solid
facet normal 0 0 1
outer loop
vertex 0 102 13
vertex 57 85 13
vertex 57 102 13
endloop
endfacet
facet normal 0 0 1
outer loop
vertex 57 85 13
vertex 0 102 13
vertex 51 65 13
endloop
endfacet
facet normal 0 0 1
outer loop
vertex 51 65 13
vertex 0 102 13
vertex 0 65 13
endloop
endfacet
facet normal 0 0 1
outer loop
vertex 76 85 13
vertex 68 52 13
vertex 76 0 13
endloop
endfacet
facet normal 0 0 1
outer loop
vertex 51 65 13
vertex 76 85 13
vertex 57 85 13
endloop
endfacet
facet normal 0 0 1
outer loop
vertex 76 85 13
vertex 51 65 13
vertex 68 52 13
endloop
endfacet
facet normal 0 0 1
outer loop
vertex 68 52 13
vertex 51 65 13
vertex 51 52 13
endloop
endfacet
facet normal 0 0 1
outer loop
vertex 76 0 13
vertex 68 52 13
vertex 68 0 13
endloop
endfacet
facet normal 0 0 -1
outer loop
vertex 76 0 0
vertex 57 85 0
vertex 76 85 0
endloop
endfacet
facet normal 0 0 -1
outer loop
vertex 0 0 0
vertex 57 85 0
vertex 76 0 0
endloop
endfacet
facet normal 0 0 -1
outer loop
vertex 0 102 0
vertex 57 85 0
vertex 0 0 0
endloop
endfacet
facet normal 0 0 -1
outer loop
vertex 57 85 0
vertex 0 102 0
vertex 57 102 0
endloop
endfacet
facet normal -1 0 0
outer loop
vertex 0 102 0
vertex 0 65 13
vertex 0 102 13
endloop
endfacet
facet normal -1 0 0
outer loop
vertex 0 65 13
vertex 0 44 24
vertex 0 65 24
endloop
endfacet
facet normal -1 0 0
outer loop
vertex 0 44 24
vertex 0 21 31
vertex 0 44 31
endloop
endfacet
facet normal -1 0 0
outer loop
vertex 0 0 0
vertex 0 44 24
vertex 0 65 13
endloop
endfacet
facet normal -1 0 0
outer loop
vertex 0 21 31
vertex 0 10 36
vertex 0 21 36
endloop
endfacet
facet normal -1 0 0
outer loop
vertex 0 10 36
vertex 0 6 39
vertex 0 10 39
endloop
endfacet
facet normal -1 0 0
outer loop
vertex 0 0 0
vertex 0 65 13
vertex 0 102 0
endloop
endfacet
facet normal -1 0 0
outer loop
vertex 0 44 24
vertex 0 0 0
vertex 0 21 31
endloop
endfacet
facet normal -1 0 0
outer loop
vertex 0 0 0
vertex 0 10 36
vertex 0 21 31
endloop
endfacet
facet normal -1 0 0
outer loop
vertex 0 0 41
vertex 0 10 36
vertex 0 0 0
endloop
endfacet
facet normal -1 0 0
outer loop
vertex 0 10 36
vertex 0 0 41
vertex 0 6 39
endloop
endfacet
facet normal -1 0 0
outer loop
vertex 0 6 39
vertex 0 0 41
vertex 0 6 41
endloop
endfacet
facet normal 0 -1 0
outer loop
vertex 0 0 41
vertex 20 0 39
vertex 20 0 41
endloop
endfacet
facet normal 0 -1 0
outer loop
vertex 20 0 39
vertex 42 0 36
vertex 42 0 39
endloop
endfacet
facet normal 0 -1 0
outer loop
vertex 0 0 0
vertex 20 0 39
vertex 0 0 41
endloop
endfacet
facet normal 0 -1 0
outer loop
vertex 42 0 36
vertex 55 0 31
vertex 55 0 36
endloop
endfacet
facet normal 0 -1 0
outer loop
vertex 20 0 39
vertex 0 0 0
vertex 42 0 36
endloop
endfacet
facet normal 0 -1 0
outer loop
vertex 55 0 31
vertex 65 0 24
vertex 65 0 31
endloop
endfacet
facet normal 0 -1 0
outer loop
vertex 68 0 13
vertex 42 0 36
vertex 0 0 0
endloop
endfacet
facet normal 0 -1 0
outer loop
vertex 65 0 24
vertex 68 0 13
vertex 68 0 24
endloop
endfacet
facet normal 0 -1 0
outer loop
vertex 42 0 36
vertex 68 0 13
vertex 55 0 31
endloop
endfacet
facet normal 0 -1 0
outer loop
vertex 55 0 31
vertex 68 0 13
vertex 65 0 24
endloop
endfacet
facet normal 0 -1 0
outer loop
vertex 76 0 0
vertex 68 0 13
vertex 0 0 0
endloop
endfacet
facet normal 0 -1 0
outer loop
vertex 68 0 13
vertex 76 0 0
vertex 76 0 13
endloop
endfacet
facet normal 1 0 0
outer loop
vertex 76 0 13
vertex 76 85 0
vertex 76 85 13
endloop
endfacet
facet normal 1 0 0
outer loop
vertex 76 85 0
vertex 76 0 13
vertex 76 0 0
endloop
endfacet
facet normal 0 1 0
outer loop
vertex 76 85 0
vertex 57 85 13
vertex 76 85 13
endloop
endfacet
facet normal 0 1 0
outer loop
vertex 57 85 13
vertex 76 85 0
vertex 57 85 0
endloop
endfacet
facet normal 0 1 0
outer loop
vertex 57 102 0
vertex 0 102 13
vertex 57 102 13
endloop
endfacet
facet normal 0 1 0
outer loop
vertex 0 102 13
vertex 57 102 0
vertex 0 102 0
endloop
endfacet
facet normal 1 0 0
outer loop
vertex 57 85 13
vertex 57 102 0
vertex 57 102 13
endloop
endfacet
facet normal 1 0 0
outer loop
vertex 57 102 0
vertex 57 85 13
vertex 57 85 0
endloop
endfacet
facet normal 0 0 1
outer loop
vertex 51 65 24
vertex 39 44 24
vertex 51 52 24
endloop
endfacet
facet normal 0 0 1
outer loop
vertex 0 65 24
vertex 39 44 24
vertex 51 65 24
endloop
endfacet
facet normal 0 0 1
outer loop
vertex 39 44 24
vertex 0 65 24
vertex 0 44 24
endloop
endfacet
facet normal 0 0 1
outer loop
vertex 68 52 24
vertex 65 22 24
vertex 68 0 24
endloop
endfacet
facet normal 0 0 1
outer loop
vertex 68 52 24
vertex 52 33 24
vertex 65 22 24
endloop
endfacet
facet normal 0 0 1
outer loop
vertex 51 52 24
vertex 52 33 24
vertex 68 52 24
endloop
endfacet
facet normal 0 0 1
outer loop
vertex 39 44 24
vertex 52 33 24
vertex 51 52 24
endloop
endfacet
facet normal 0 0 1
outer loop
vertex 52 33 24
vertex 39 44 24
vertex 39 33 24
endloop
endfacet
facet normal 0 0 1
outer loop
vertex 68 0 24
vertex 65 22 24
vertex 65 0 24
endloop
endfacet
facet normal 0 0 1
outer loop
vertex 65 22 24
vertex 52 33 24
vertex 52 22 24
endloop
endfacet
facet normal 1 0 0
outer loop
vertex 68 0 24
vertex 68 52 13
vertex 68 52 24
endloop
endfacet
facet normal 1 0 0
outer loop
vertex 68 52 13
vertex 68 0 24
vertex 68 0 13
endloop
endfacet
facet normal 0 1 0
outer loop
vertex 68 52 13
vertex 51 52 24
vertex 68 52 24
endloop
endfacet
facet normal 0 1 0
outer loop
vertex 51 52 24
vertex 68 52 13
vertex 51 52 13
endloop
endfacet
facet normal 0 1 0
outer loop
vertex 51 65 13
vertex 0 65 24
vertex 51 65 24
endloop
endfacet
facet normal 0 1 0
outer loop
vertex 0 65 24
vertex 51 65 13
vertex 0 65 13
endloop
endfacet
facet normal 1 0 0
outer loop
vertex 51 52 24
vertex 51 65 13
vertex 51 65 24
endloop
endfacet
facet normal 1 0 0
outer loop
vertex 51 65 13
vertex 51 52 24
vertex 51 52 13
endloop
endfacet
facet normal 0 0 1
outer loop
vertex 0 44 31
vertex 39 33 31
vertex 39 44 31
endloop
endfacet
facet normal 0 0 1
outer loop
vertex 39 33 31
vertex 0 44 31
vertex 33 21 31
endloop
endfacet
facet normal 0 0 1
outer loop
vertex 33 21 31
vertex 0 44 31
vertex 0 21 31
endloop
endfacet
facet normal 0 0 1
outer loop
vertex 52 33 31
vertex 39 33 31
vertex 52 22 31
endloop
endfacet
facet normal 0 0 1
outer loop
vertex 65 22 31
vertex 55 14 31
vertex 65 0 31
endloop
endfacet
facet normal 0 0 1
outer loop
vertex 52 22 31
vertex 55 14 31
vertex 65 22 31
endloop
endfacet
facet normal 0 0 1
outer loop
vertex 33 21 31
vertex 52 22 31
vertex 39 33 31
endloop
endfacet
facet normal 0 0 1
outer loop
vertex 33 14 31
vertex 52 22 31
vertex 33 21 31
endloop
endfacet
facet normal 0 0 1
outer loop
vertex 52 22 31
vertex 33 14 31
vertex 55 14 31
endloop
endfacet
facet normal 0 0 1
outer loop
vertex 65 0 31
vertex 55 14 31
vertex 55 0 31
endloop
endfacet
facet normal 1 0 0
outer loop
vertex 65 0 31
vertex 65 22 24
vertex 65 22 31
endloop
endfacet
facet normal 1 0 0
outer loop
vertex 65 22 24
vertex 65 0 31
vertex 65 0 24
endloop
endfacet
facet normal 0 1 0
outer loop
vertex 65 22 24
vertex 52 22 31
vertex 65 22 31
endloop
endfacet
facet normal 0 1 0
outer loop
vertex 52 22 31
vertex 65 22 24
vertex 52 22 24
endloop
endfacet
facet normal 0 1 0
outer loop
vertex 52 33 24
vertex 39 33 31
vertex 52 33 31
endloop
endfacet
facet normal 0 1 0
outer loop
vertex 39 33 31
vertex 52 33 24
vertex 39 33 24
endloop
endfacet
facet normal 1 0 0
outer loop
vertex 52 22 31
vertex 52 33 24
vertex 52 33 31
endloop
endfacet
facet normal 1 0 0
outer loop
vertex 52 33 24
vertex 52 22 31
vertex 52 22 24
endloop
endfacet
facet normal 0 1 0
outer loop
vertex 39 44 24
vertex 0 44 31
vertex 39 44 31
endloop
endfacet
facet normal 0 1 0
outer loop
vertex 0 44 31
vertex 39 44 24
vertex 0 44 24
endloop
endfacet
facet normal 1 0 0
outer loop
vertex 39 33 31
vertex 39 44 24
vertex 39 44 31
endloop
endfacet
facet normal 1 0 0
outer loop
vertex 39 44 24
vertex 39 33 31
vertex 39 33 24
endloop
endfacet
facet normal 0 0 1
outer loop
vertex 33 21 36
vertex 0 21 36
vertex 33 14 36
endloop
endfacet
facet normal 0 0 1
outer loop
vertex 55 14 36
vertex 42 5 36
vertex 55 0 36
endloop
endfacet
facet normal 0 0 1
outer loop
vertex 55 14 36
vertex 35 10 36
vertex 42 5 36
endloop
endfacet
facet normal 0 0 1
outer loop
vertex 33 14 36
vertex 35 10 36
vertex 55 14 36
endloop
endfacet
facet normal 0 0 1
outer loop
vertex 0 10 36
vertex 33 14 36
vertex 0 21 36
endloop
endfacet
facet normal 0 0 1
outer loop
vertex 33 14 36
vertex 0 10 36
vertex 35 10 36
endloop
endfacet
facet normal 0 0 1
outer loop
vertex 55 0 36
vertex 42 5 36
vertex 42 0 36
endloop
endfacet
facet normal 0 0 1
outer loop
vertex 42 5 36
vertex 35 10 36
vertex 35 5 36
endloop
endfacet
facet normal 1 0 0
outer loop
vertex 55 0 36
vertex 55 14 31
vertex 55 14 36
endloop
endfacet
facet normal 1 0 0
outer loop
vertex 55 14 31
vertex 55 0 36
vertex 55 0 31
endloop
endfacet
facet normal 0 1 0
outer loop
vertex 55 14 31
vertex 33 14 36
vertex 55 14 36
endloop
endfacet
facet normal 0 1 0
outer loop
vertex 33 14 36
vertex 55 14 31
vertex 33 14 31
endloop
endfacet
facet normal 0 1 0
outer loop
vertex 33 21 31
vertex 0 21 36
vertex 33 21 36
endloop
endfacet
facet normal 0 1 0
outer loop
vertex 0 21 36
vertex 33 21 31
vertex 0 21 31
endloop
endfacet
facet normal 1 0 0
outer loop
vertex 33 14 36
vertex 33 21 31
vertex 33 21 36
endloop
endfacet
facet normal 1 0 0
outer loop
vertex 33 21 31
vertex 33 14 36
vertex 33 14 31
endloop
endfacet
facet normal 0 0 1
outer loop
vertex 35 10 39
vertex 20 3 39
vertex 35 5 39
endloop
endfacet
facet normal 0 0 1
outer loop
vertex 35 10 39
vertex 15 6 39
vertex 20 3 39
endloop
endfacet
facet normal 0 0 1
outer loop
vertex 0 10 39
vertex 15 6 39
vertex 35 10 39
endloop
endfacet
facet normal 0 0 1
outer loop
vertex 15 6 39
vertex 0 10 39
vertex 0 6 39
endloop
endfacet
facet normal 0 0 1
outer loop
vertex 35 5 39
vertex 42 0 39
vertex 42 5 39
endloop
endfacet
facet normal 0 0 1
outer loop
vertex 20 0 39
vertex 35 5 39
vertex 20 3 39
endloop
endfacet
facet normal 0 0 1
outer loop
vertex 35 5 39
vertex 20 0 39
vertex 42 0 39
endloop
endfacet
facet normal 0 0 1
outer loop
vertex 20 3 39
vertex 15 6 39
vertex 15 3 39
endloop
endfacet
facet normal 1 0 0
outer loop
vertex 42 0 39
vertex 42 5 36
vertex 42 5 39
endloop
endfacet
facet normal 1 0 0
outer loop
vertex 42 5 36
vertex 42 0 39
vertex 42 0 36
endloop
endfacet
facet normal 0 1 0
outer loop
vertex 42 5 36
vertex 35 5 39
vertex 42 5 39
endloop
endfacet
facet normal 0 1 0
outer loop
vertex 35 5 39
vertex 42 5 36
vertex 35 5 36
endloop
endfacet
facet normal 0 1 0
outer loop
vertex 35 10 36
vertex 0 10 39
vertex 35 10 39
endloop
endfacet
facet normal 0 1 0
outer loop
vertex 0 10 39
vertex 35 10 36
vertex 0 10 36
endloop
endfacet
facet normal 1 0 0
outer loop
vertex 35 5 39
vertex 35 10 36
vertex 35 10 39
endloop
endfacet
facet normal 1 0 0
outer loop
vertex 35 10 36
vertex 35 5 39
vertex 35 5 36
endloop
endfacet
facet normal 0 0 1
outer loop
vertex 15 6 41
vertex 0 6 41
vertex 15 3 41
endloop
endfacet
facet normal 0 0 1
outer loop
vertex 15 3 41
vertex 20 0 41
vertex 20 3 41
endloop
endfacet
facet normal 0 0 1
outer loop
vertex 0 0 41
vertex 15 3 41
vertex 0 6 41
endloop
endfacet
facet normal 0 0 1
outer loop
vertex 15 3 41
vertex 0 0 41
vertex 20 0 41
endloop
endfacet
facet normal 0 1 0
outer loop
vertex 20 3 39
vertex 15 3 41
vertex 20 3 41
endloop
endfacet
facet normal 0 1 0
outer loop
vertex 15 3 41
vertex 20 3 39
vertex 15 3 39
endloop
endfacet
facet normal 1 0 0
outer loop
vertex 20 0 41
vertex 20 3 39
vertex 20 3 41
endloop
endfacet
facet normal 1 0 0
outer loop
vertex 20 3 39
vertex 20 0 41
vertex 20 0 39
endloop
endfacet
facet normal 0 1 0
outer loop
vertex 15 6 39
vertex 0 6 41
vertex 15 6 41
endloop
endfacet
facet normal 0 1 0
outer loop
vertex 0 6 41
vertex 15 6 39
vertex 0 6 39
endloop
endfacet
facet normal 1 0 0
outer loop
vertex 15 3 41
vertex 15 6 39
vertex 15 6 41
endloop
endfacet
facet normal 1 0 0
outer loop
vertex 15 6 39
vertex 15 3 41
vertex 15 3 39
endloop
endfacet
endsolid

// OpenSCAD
translate([9.5, 8.5, 6.5]) color([0.4012165411640888, 0.4679428423906348, 0.5596131508667647]) cube([19, 17, 13], center=true);
translate([28.5, 8.5, 6.5]) color([0.29896126951320356, 0.6321114709426877, 0.7423454703026071]) cube([19, 17, 13], center=true);
translate([47.5, 8.5, 6.5]) color([0.21800995973285464, 0.48885816108208613, 0.501567157493831]) cube([19, 17, 13], center=true);
translate([66.5, 8.5, 6.5]) color([0.49271975198428686, 0.958422556968198, 0.44398175403613704]) cube([19, 17, 13], center=true);
translate([9.5, 25.5, 6.5]) color([0.14281143058247625, 0.4955231327742775, 0.8873352305676206]) cube([19, 17, 13], center=true);
translate([28.5, 25.5, 6.5]) color([0.21571394075115613, 0.3554013630116646, 0.39096604949642]) cube([19, 17, 13], center=true);
translate([47.5, 25.5, 6.5]) color([0.9928835035123682, 0.8462248334797323, 0.9789066021625461]) cube([19, 17, 13], center=true);
translate([66.5, 25.5, 6.5]) color([0.6868956228130294, 0.08137290691060206, 0.9493092651810784]) cube([19, 17, 13], center=true);
translate([9.5, 42.5, 6.5]) color([0.9246190463677613, 0.3951154575230438, 0.3612783181755085]) cube([19, 17, 13], center=true);
translate([28.5, 42.5, 6.5]) color([0.11615210489091876, 0.0037403702712440756, 0.2703277384724262]) cube([19, 17, 13], center=true);
translate([47.5, 42.5, 6.5]) color([0.6403732426441148, 0.29252642189785794, 0.9007258804640697]) cube([19, 17, 13], center=true);
translate([66.5, 42.5, 6.5]) color([0.14067978971908934, 0.5728503338092871, 0.1912043400515635]) cube([19, 17, 13], center=true);
translate([9.5, 59.5, 6.5]) color([0.43401891336511733, 0.7163457448050065, 0.3841301513333275]) cube([19, 17, 13], center=true);
translate([28.5, 59.5, 6.5]) color([0.33069552050314754, 0.6480049557775331, 0.6874717059379091]) cube([19, 17, 13], center=true);
translate([47.5, 59.5, 6.5]) color([0.14801928734251768, 0.93323205939552, 0.14750072005511716]) cube([19, 17, 13], center=true);
translate([66.5, 59.5, 6.5]) color([0.31607169754224296, 0.2088660889148145, 0.1868244368145192]) cube([19, 17, 13], center=true);
translate([9.5, 76.5, 6.5]) color([0.3491672112743387, 0.9834841816788549, 0.427290207198605]) cube([19, 17, 13], center=true);
translate([28.5, 76.5, 6.5]) color([0.49195852420878716, 0.7297831417632067, 0.7955834433152874]) cube([19, 17, 13], center=true);
translate([47.5, 76.5, 6.5]) color([0.43927203819181504, 0.2042687131951023, 0.709997013582239]) cube([19, 17, 13], center=true);
translate([66.5, 76.5, 6.5]) color([0.9058221085991531, 0.03327924187503195, 0.6331757983912308]) cube([19, 17, 13], center=true);
translate([9.5, 93.5, 6.5]) color([0.8710093735661795, 0.3636101637556439, 0.7431628081058981]) cube([19, 17, 13], center=true);
translate([28.5, 93.5, 6.5]) color([0.6774926049513658, 0.23306417175218364, 0.2975271762349214]) cube([19, 17, 13], center=true);
translate([47.5, 93.5, 6.5]) color([0.0866296567389645, 0.8688435220131177, 0.7514921149941085]) cube([19, 17, 13], center=true);
translate([8.5, 6.5, 18.5]) color([0.7714305883456576, 0.8829516943772963, 0.4114323292545551]) cube([17, 13, 11], center=true);
translate([25.5, 6.5, 18.5]) color([0.05394001775890156, 0.696805048854085, 0.6656296547984208]) cube([17, 13, 11], center=true);
translate([42.5, 6.5, 18.5]) color([0.6485122289860075, 0.5471816206705559, 0.7344166333532061]) cube([17, 13, 11], center=true);
translate([59.5, 6.5, 18.5]) color([0.4306045068871984, 0.45460236437769275, 0.25475221651879554]) cube([17, 13, 11], center=true);
translate([8.5, 19.5, 18.5]) color([0.47565246533915095, 0.3371942584654095, 0.04223511400675217]) cube([17, 13, 11], center=true);
translate([25.5, 19.5, 18.5]) color([0.05255331220371673, 0.34980223330761895, 0.2898096938030986]) cube([17, 13, 11], center=true);
translate([42.5, 19.5, 18.5]) color([0.007130057665757694, 0.06369015415518986, 0.42774457246440645]) cube([17, 13, 11], center=true);
translate([59.5, 19.5, 18.5]) color([0.22216650821772055, 0.6086379170158094, 0.557768500755667]) cube([17, 13, 11], center=true);
translate([8.5, 32.5, 18.5]) color([0.22097295115667703, 0.19284823789822858, 0.6083188139076446]) cube([17, 13, 11], center=true);
translate([25.5, 32.5, 18.5]) color([0.606354511401297, 0.08562053587131313, 0.31903016062772993]) cube([17, 13, 11], center=true);
translate([42.5, 32.5, 18.5]) color([0.53590115499306, 0.8934753784920533, 0.25549985489866966]) cube([17, 13, 11], center=true);
translate([59.5, 32.5, 18.5]) color([0.5219903070058861, 0.1901317713313112, 0.08011594570868696]) cube([17, 13, 11], center=true);
translate([8.5, 45.5, 18.5]) color([0.8699478397109702, 0.3457472114844995, 0.837290862214726]) cube([17, 13, 11], center=true);
translate([25.5, 45.5, 18.5]) color([0.25127706432840136, 0.7290260027021367, 0.3013213449137814]) cube([17, 13, 11], center=true);
translate([42.5, 45.5, 18.5]) color([0.5169005458056509, 0.38467176448284957, 0.4820846642847386]) cube([17, 13, 11], center=true);
translate([59.5, 45.5, 18.5]) color([0.8719757028853922, 0.2399620044566907, 0.3058147052987177]) cube([17, 13, 11], center=true);
translate([8.5, 58.5, 18.5]) color([0.5519737755681405, 0.009208459116004764, 0.4953005367860557]) cube([17, 13, 11], center=true);
translate([25.5, 58.5, 18.5]) color([0.43819859659275806, 0.9171481192782721, 0.41212019308576986]) cube([17, 13, 11], center=true);
translate([42.5, 58.5, 18.5]) color([0.49358197644734136, 0.44010860560926524, 0.0856157398333921]) cube([17, 13, 11], center=true);
translate([6.5, 5.5, 27.5]) color([0.2411443971002879, 0.8262650576639278, 0.15379567752788093]) cube([13, 11, 7], center=true);
translate([19.5, 5.5, 27.5]) color([0.8842528530898255, 0.2134665283608419, 0.6127566924478359]) cube([13, 11, 7], center=true);
translate([32.5, 5.5, 27.5]) color([0.818008657000479, 0.5590112191053322, 0.8866043301622452]) cube([13, 11, 7], center=true);
translate([45.5, 5.5, 27.5]) color([0.39447102725022787, 0.9589163376419946, 0.24972819156954773]) cube([13, 11, 7], center=true);
translate([58.5, 5.5, 27.5]) color([0.22005049979750413, 0.8404590105346786, 0.2789960200671917]) cube([13, 11, 7], center=true);
translate([6.5, 16.5, 27.5]) color([0.35210354864297055, 0.9946691500756418, 0.10728537706325991]) cube([13, 11, 7], center=true);
translate([19.5, 16.5, 27.5]) color([0.8996256313138141, 0.6100819970747507, 0.7890377134172993]) cube([13, 11, 7], center=true);
translate([32.5, 16.5, 27.5]) color([0.7110679469752405, 0.7774643558396669, 0.5140354678382717]) cube([13, 11, 7], center=true);
translate([45.5, 16.5, 27.5]) color([0.46207744282607, 0.6343562920465169, 0.27254621857246664]) cube([13, 11, 7], center=true);
translate([58.5, 16.5, 27.5]) color([0.016558424522952975, 0.6148716567717017, 0.7119066573597548]) cube([13, 11, 7], center=true);
translate([6.5, 27.5, 27.5]) color([0.17257617960039529, 0.41465974039415787, 0.21806470516739018]) cube([13, 11, 7], center=true);
translate([19.5, 27.5, 27.5]) color([0.8797884787327306, 0.9971497033508181, 0.006439244314443648]) cube([13, 11, 7], center=true);
translate([32.5, 27.5, 27.5]) color([0.5355241113549698, 0.428269623660265, 0.0497703561320445]) cube([13, 11, 7], center=true);
translate([45.5, 27.5, 27.5]) color([0.3846945959716809, 0.27248481749180187, 0.9711494351721061]) cube([13, 11, 7], center=true);
translate([6.5, 38.5, 27.5]) color([0.5646669518865992, 0.22956269737245216, 0.7165492601952248]) cube([13, 11, 7], center=true);
translate([19.5, 38.5, 27.5]) color([0.5466375027642284, 0.2821670936164109, 0.7398695784196249]) cube([13, 11, 7], center=true);
translate([32.5, 38.5, 27.5]) color([0.9015687423954613, 0.06478718309218656, 0.3075184499818515]) cube([13, 11, 7], center=true);
translate([5.5, 3.5, 33.5]) color([0.32730937178137276, 0.373196919474838, 0.48026967262350795]) cube([11, 7, 5], center=true);
translate([16.5, 3.5, 33.5]) color([0.5820603979481933, 0.1372879505883815, 0.015498761483451418]) cube([11, 7, 5], center=true);
translate([27.5, 3.5, 33.5]) color([0.5048497045627587, 0.36698725510709684, 0.6348155217266559]) cube([11, 7, 5], center=true);
translate([38.5, 3.5, 33.5]) color([0.811995686067811, 0.8768405645756486, 0.1552431358080847]) cube([11, 7, 5], center=true);
translate([49.5, 3.5, 33.5]) color([0.1767648869043179, 0.991228648099722, 0.13558077637136434]) cube([11, 7, 5], center=true);
translate([5.5, 10.5, 33.5]) color([0.20650423900368708, 0.9151210693627757, 0.49673738754911745]) cube([11, 7, 5], center=true);
translate([16.5, 10.5, 33.5]) color([0.7672539256192649, 0.969306850533619, 0.23531586477578126]) cube([11, 7, 5], center=true);
translate([27.5, 10.5, 33.5]) color([0.13212860983739783, 0.23368957459901674, 0.38460662479298113]) cube([11, 7, 5], center=true);
translate([38.5, 10.5, 33.5]) color([0.6084990843462054, 0.1325407149567407, 0.4984659545183915]) cube([11, 7, 5], center=true);
translate([49.5, 10.5, 33.5]) color([0.9178662904203972, 0.6160167741323543, 0.02601445858505036]) cube([11, 7, 5], center=true);
translate([5.5, 17.5, 33.5]) color([0.596125612844632, 0.48919913512172475, 0.30869925031539414]) cube([11, 7, 5], center=true);
translate([16.5, 17.5, 33.5]) color([0.9586301909392594, 0.5555224541780607, 0.16303723797834868]) cube([11, 7, 5], center=true);
translate([27.5, 17.5, 33.5]) color([0.8790785483620981, 0.8092366229990562, 0.7373715302416316]) cube([11, 7, 5], center=true);
translate([3.5, 2.5, 37.5]) color([0.5460288399006699, 0.7042240787132147, 0.07877233817546292]) cube([7, 5, 3], center=true);
translate([10.5, 2.5, 37.5]) color([0.13744427713979768, 0.40185422229333856, 0.1910666288561843]) cube([7, 5, 3], center=true);
translate([17.5, 2.5, 37.5]) color([0.31642065037316636, 0.2917281417853558, 0.9437754009602987]) cube([7, 5, 3], center=true);
translate([24.5, 2.5, 37.5]) color([0.20866341172373193, 0.3151573145870893, 0.7470721078045024]) cube([7, 5, 3], center=true);
translate([31.5, 2.5, 37.5]) color([0.24960896628473228, 0.8629627260654799, 0.6684326881602258]) cube([7, 5, 3], center=true);
translate([38.5, 2.5, 37.5]) color([0.6597695027130189, 0.22591717735012307, 0.3441717078654829]) cube([7, 5, 3], center=true);
translate([3.5, 7.5, 37.5]) color([0.16233220178561225, 0.01697652307419406, 0.5735931064152219]) cube([7, 5, 3], center=true);
translate([10.5, 7.5, 37.5]) color([0.05818297514553228, 0.6304378073753134, 0.35341956482818127]) cube([7, 5, 3], center=true);
translate([17.5, 7.5, 37.5]) color([0.49110709598533775, 0.06132304686728618, 0.24146702174069912]) cube([7, 5, 3], center=true);
translate([24.5, 7.5, 37.5]) color([0.012441234482642782, 0.9455344576677447, 0.3266678829978785]) cube([7, 5, 3], center=true);
translate([31.5, 7.5, 37.5]) color([0.820956849026723, 0.34492851027915805, 0.6639756368298299]) cube([7, 5, 3], center=true);
translate([2.5, 1.5, 40.0]) color([0.13585073420724958, 0.9219835342207869, 0.44896684911260887]) cube([5, 3, 2], center=true);
translate([7.5, 1.5, 40.0]) color([0.1420549627992148, 0.3119518323014343, 0.6490756968320398]) cube([5, 3, 2], center=true);
translate([12.5, 1.5, 40.0]) color([0.7280642389267371, 0.7852833252199665, 0.40863068686923587]) cube([5, 3, 2], center=true);
translate([17.5, 1.5, 40.0]) color([0.009633238682779877, 0.8909238596539266, 0.533705581213062]) cube([5, 3, 2], center=true);
translate([2.5, 4.5, 40.0]) color([0.8046005274030336, 0.9806276909012095, 0.7049346898693578]) cube([5, 3, 2], center=true);
translate([7.5, 4.5, 40.0]) color([0.7590860206033218, 0.5647284680717275, 0.12259546226958773]) cube([5, 3, 2], center=true);
translate([12.5, 4.5, 40.0]) color([0.9539533584587191, 0.1713156178825357, 0.5005542720722199]) cube([5, 3, 2], center=true);
